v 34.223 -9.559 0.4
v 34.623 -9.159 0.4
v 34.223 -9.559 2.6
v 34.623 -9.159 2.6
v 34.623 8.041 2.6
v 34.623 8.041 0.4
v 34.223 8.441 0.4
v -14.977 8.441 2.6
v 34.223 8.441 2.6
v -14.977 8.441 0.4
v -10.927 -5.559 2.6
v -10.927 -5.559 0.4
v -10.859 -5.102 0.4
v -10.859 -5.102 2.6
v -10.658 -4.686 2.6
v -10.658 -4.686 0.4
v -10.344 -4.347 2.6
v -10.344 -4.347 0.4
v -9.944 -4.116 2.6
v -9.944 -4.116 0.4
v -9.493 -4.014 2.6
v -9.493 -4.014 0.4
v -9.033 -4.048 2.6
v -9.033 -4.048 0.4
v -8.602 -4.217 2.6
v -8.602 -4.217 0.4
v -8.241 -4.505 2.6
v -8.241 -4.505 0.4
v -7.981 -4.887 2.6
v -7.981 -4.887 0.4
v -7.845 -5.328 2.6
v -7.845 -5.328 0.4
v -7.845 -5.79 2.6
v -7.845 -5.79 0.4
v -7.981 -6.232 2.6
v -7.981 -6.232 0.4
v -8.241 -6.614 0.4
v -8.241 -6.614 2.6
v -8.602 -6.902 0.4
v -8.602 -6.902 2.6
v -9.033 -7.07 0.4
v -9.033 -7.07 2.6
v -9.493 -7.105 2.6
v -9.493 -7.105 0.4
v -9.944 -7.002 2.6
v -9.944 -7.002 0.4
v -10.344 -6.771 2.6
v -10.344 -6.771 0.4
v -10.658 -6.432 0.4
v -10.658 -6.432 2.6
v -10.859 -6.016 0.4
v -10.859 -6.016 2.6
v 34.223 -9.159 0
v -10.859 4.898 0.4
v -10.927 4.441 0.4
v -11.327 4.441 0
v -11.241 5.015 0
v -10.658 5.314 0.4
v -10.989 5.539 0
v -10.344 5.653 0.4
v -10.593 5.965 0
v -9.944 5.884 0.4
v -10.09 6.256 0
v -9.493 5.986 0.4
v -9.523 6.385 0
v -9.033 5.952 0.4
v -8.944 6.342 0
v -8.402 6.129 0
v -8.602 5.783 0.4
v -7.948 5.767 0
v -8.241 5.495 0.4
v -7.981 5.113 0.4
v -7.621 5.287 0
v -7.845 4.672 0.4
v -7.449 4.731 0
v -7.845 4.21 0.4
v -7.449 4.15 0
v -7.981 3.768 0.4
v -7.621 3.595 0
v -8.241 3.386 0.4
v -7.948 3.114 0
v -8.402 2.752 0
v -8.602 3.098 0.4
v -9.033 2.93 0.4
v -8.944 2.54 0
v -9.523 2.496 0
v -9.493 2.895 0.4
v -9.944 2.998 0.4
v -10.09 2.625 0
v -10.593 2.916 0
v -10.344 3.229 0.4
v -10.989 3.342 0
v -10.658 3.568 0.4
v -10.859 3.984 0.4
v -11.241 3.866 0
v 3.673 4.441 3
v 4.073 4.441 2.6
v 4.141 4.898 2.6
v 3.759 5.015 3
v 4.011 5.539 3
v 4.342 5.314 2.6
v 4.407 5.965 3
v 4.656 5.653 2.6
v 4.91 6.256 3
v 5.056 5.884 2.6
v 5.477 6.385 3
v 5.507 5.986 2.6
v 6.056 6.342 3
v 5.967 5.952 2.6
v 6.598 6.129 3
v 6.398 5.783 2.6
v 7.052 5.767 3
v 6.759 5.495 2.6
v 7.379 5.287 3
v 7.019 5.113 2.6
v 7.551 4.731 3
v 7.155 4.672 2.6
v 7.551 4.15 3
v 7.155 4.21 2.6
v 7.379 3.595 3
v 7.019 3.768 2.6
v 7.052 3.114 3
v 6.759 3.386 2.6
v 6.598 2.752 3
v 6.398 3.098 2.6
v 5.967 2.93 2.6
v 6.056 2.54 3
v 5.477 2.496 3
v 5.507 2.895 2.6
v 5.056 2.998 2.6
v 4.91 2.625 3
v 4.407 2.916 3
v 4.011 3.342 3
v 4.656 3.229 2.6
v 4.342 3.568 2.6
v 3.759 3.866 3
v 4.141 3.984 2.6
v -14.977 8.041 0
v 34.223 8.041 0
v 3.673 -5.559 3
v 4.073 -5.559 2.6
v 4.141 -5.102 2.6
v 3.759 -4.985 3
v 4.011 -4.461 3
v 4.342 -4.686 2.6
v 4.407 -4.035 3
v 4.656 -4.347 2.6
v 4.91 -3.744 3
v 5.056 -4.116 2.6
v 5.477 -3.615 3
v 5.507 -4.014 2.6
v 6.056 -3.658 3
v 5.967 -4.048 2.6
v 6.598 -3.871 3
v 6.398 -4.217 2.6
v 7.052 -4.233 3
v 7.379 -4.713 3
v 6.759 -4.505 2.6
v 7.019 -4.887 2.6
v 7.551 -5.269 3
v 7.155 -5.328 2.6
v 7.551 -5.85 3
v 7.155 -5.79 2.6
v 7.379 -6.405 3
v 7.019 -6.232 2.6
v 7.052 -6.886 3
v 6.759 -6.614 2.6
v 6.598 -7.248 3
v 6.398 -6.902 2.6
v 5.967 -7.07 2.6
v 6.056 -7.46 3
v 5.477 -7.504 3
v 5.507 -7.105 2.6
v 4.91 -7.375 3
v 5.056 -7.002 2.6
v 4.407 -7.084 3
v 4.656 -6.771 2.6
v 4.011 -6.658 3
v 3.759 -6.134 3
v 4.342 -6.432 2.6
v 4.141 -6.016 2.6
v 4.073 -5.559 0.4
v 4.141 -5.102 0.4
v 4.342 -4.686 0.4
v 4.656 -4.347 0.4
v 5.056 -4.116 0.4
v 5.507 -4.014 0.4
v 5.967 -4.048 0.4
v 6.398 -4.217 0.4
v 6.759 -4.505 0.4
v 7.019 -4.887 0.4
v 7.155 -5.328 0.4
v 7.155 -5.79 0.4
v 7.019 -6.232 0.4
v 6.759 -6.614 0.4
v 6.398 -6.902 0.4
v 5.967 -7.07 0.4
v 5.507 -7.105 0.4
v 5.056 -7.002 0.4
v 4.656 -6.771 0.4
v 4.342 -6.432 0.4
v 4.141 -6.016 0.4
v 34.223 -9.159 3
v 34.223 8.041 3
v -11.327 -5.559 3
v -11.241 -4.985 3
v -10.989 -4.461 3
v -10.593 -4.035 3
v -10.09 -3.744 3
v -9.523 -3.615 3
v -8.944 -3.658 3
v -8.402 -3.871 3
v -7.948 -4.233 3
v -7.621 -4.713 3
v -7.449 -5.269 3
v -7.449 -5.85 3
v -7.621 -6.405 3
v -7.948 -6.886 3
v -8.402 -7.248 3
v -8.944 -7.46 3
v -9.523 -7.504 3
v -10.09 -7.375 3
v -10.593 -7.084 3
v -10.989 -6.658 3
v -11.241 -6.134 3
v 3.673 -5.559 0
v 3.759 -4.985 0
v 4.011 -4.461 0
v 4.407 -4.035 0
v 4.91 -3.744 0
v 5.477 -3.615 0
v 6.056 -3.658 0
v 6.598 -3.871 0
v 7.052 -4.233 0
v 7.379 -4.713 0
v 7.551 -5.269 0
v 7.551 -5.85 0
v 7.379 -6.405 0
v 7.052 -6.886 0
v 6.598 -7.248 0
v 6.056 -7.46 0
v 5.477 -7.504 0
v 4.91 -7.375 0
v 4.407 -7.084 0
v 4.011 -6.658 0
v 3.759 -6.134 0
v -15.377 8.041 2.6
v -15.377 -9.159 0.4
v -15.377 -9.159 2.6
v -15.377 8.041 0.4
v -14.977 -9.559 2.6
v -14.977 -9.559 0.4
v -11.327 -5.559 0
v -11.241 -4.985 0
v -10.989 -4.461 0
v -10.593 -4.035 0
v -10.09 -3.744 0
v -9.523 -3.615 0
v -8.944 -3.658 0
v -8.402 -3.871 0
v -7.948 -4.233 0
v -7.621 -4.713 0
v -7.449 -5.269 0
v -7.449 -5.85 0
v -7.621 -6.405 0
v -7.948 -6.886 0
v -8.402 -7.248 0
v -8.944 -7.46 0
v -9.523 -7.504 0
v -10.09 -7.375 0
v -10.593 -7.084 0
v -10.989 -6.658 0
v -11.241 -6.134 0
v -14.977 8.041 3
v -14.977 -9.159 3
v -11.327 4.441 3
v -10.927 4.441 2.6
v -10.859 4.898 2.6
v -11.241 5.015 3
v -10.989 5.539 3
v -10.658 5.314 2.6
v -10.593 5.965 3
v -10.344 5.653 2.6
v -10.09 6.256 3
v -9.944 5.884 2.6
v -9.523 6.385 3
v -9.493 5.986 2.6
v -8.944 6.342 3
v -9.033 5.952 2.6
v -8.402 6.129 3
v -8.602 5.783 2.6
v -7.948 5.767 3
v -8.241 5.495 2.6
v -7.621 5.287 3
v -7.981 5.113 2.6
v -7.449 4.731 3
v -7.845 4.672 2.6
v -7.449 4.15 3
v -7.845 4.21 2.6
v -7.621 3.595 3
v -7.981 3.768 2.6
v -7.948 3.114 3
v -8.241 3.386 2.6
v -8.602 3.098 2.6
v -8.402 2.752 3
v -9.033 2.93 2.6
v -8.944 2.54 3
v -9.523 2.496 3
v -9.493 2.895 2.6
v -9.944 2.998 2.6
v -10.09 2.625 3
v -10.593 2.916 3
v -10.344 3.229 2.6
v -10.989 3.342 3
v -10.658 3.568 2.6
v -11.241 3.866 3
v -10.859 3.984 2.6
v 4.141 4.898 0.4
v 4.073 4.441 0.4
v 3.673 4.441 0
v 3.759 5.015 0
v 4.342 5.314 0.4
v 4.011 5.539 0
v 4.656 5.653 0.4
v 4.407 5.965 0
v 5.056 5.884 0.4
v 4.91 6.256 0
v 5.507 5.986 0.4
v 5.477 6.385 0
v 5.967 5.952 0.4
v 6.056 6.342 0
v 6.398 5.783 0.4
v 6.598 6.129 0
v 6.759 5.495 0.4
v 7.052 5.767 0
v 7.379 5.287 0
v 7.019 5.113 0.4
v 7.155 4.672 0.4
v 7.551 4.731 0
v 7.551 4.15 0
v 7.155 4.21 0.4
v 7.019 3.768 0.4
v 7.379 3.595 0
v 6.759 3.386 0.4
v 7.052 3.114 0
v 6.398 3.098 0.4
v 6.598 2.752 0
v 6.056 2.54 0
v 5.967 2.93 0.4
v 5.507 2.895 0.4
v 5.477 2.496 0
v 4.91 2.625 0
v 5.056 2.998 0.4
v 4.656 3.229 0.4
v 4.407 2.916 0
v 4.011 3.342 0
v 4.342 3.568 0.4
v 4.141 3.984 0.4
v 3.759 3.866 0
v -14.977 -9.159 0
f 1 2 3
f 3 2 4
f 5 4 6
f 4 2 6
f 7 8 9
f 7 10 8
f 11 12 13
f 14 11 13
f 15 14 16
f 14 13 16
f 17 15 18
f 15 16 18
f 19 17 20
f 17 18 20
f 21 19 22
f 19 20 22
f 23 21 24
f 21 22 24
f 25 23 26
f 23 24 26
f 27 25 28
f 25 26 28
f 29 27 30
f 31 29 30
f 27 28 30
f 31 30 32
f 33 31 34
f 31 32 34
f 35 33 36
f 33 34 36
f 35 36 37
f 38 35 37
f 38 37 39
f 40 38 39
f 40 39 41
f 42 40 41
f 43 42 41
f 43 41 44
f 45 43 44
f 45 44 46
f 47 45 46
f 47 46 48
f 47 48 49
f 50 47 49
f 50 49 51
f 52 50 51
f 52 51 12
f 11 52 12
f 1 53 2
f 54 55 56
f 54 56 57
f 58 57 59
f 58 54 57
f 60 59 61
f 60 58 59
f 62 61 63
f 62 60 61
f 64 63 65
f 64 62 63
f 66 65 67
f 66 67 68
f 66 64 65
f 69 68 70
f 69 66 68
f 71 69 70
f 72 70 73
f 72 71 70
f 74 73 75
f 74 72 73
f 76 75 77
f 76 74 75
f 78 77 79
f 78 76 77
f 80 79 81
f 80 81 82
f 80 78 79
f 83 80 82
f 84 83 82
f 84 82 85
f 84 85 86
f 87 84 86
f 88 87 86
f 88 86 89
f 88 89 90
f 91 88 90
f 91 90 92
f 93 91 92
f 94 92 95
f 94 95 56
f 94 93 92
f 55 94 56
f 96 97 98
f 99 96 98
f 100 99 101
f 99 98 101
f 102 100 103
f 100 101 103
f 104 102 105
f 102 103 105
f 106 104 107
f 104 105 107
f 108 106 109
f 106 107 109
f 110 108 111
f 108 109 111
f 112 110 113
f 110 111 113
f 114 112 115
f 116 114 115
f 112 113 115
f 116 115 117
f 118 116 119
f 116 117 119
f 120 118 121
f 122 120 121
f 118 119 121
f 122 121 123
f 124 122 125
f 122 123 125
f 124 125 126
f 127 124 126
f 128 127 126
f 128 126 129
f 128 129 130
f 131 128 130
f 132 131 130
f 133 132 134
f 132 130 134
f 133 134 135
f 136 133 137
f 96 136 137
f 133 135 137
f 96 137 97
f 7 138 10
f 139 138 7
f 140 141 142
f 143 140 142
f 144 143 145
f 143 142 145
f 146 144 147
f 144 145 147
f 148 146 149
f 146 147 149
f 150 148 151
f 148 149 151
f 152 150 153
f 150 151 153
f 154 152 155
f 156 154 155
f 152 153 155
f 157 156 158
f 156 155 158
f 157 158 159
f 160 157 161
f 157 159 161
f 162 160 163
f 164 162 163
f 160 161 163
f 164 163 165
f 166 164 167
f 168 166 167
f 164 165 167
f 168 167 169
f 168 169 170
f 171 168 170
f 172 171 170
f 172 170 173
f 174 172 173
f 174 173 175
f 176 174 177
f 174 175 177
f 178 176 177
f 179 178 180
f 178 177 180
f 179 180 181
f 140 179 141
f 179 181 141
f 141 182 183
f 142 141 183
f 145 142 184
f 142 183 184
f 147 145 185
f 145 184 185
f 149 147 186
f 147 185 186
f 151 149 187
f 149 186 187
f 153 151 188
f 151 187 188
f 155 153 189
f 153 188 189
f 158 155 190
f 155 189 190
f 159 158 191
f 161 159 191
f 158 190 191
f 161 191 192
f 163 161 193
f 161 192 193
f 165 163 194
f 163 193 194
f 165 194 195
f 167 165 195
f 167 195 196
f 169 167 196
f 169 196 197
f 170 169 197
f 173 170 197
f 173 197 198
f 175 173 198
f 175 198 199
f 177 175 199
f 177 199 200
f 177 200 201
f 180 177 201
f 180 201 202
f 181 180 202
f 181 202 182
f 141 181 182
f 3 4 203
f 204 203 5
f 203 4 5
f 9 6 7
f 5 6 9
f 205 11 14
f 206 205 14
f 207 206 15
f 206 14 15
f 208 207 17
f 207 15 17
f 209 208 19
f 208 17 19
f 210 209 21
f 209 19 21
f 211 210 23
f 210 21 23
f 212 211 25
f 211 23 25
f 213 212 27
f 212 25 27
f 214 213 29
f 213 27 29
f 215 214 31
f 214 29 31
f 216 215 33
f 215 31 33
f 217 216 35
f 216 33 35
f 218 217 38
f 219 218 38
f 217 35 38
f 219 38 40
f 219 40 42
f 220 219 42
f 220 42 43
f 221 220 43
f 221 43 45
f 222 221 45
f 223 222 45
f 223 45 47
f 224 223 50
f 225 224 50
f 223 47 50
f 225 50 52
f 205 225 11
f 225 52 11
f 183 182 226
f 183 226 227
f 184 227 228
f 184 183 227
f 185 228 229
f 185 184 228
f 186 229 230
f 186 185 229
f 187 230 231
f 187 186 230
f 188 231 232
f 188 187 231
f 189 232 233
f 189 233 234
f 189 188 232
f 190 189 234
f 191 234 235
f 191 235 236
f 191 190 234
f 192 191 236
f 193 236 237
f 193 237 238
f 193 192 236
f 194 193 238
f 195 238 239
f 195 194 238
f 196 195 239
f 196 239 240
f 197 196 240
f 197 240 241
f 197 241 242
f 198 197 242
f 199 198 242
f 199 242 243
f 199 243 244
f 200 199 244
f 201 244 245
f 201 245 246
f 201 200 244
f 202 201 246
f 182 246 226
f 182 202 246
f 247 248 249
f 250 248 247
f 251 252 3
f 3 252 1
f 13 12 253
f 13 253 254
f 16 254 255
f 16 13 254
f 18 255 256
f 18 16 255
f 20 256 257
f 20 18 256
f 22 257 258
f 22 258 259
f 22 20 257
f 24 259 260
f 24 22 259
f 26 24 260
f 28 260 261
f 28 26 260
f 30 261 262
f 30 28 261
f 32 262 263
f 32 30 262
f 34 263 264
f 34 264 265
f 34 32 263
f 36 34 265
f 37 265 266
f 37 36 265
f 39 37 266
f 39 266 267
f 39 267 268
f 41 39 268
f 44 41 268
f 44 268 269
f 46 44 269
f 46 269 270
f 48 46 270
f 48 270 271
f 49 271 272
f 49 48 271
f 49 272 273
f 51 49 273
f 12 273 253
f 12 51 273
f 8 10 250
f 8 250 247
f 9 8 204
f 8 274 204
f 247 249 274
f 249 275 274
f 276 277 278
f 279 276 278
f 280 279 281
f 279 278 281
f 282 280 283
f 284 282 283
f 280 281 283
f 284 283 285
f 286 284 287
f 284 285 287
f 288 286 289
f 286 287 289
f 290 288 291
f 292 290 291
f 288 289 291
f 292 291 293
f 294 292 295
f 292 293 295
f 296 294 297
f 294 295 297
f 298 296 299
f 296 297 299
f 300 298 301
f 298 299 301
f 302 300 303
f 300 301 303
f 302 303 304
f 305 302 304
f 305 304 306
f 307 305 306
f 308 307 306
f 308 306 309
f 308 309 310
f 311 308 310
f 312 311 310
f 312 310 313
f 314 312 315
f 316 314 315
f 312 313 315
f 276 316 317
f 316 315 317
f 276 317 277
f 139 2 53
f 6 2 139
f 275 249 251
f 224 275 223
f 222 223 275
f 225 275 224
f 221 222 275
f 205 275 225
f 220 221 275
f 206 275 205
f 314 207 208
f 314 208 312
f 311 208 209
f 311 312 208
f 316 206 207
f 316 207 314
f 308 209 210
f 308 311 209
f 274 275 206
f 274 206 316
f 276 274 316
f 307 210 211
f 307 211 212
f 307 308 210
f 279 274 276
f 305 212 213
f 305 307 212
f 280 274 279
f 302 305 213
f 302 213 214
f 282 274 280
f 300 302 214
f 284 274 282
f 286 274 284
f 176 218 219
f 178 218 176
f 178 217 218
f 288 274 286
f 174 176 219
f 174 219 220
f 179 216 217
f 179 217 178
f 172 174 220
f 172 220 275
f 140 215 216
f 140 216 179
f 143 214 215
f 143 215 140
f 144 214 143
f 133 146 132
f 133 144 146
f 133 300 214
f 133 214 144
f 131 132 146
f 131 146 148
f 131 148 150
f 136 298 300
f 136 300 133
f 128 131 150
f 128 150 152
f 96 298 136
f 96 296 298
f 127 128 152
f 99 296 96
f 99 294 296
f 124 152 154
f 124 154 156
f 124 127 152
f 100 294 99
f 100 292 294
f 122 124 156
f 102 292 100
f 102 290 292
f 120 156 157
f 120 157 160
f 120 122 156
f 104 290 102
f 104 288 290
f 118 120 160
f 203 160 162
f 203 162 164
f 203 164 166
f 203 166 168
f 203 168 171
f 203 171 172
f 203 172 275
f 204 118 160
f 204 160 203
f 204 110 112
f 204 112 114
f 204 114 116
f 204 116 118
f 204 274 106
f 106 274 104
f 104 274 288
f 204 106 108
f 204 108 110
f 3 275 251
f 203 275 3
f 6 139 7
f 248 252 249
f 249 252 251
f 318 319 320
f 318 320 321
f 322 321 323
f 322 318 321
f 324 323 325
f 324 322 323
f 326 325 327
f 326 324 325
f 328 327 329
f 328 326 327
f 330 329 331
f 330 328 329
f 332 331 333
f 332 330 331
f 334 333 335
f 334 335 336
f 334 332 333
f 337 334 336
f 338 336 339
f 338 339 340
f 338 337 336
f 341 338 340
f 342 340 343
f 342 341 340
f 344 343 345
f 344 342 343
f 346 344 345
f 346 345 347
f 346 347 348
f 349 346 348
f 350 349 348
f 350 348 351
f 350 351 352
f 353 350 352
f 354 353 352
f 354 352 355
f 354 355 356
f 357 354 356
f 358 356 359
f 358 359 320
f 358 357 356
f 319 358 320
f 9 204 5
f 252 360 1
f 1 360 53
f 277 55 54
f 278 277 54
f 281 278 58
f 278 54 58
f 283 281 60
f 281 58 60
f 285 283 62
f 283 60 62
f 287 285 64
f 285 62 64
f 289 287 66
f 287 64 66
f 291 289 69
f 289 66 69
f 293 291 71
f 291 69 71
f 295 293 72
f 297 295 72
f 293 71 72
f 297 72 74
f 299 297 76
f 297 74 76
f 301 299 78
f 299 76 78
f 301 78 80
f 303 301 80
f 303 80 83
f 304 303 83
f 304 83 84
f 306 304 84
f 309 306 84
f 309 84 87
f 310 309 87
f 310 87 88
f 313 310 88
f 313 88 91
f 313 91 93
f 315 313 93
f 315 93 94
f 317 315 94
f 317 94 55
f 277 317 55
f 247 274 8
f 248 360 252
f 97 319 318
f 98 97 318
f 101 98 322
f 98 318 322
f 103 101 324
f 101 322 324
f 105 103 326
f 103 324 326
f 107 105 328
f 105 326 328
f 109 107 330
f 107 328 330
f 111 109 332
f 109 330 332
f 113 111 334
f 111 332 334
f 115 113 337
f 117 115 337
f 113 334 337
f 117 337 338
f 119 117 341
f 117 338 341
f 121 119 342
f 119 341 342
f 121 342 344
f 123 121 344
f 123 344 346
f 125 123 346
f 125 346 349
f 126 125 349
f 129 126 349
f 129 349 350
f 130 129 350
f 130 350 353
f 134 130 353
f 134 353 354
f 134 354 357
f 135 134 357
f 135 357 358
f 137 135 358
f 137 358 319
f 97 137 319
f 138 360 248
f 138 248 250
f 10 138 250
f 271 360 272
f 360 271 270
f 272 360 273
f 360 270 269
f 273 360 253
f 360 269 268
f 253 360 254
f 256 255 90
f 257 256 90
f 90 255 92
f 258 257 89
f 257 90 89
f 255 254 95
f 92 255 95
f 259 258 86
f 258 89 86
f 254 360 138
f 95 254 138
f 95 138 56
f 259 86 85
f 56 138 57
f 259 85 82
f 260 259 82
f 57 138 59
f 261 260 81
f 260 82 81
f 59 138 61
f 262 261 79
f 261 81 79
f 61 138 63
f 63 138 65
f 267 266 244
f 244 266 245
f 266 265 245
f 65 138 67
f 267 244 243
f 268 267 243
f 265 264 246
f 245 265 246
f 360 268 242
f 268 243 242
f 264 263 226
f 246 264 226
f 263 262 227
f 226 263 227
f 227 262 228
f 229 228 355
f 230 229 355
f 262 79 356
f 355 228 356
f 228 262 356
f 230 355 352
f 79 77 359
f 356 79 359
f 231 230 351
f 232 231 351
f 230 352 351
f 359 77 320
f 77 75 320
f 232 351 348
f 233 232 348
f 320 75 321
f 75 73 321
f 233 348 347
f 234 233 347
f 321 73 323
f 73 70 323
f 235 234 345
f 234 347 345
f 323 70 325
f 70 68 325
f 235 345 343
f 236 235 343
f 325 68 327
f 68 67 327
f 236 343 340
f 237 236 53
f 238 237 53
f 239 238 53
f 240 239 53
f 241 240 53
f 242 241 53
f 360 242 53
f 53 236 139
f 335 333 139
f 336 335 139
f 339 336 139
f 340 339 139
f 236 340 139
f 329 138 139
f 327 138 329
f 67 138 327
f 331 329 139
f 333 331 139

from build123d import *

# Parameters (mm, degrees)
SKIZZE1_W                       = 50
SKIZZE1_H                       = 18
AUFSATZ_LINEAR_AUSTRAGEN1_DEPTH = 3
SKIZZE2_R                       = 1.55
SCHNITT_LINEAR_AUSTRAGEN1_DEPTH = 37.043046724
FASE1_SIZE                      = 0.4


with BuildPart() as part:
    # Skizze1 → Aufsatz-Linear austragen1 (new body)
    with BuildSketch(Plane.XY):
        with Locations((9.62254438, -0.559322034)):
            Rectangle(SKIZZE1_W, SKIZZE1_H)
    extrude(amount=AUFSATZ_LINEAR_AUSTRAGEN1_DEPTH)

    # Skizze2 → Schnitt-Linear austragen1 (cut, through all)
    with BuildSketch(Plane(origin=(0, 0, 0), x_dir=(-1, 0, 0), z_dir=(0, 0, -1))):
        with Locations((9.37745562, 4.440677966)):
            Circle(SKIZZE2_R)
        with Locations((-5.62254438, 4.440677966)):
            Circle(SKIZZE2_R)
        with Locations((-5.62254438, -5.559322034)):
            Circle(SKIZZE2_R)
        with Locations((9.37745562, -5.559322034)):
            Circle(SKIZZE2_R)
    extrude(amount=-SCHNITT_LINEAR_AUSTRAGEN1_DEPTH, mode=Mode.SUBTRACT)

    # Fase1
    fase1_edges = [part.edges().sort_by_distance(p)[0] for p in [
        (34.62254438, -0.559322034, 3),
        (9.62254438, 8.440677966, 3),
        (-7.82745562, -5.559322034, 3),
        (-7.82745562, -5.559322034, 0),
        (7.17254438, -5.559322034, 3),
        (7.17254438, -5.559322034, 0),
        (7.17254438, 4.440677966, 3),
        (7.17254438, 4.440677966, 0),
        (-7.82745562, 4.440677966, 3),
        (-7.82745562, 4.440677966, 0),
        (-15.37745562, -0.559322034, 3),
        (9.62254438, 8.440677966, 0),
        (34.62254438, -0.559322034, 0),
        (9.62254438, -9.559322034, 0),
        (-15.37745562, -0.559322034, 0),
        (-15.37745562, 8.440677966, 1.5),
        (34.62254438, 8.440677966, 1.5),
        (34.62254438, -9.559322034, 1.5),
        (-15.37745562, -9.559322034, 1.5),
        (9.62254438, -9.559322034, 3),
    ]]
    chamfer(fase1_edges, length=FASE1_SIZE)


solid = part.part
